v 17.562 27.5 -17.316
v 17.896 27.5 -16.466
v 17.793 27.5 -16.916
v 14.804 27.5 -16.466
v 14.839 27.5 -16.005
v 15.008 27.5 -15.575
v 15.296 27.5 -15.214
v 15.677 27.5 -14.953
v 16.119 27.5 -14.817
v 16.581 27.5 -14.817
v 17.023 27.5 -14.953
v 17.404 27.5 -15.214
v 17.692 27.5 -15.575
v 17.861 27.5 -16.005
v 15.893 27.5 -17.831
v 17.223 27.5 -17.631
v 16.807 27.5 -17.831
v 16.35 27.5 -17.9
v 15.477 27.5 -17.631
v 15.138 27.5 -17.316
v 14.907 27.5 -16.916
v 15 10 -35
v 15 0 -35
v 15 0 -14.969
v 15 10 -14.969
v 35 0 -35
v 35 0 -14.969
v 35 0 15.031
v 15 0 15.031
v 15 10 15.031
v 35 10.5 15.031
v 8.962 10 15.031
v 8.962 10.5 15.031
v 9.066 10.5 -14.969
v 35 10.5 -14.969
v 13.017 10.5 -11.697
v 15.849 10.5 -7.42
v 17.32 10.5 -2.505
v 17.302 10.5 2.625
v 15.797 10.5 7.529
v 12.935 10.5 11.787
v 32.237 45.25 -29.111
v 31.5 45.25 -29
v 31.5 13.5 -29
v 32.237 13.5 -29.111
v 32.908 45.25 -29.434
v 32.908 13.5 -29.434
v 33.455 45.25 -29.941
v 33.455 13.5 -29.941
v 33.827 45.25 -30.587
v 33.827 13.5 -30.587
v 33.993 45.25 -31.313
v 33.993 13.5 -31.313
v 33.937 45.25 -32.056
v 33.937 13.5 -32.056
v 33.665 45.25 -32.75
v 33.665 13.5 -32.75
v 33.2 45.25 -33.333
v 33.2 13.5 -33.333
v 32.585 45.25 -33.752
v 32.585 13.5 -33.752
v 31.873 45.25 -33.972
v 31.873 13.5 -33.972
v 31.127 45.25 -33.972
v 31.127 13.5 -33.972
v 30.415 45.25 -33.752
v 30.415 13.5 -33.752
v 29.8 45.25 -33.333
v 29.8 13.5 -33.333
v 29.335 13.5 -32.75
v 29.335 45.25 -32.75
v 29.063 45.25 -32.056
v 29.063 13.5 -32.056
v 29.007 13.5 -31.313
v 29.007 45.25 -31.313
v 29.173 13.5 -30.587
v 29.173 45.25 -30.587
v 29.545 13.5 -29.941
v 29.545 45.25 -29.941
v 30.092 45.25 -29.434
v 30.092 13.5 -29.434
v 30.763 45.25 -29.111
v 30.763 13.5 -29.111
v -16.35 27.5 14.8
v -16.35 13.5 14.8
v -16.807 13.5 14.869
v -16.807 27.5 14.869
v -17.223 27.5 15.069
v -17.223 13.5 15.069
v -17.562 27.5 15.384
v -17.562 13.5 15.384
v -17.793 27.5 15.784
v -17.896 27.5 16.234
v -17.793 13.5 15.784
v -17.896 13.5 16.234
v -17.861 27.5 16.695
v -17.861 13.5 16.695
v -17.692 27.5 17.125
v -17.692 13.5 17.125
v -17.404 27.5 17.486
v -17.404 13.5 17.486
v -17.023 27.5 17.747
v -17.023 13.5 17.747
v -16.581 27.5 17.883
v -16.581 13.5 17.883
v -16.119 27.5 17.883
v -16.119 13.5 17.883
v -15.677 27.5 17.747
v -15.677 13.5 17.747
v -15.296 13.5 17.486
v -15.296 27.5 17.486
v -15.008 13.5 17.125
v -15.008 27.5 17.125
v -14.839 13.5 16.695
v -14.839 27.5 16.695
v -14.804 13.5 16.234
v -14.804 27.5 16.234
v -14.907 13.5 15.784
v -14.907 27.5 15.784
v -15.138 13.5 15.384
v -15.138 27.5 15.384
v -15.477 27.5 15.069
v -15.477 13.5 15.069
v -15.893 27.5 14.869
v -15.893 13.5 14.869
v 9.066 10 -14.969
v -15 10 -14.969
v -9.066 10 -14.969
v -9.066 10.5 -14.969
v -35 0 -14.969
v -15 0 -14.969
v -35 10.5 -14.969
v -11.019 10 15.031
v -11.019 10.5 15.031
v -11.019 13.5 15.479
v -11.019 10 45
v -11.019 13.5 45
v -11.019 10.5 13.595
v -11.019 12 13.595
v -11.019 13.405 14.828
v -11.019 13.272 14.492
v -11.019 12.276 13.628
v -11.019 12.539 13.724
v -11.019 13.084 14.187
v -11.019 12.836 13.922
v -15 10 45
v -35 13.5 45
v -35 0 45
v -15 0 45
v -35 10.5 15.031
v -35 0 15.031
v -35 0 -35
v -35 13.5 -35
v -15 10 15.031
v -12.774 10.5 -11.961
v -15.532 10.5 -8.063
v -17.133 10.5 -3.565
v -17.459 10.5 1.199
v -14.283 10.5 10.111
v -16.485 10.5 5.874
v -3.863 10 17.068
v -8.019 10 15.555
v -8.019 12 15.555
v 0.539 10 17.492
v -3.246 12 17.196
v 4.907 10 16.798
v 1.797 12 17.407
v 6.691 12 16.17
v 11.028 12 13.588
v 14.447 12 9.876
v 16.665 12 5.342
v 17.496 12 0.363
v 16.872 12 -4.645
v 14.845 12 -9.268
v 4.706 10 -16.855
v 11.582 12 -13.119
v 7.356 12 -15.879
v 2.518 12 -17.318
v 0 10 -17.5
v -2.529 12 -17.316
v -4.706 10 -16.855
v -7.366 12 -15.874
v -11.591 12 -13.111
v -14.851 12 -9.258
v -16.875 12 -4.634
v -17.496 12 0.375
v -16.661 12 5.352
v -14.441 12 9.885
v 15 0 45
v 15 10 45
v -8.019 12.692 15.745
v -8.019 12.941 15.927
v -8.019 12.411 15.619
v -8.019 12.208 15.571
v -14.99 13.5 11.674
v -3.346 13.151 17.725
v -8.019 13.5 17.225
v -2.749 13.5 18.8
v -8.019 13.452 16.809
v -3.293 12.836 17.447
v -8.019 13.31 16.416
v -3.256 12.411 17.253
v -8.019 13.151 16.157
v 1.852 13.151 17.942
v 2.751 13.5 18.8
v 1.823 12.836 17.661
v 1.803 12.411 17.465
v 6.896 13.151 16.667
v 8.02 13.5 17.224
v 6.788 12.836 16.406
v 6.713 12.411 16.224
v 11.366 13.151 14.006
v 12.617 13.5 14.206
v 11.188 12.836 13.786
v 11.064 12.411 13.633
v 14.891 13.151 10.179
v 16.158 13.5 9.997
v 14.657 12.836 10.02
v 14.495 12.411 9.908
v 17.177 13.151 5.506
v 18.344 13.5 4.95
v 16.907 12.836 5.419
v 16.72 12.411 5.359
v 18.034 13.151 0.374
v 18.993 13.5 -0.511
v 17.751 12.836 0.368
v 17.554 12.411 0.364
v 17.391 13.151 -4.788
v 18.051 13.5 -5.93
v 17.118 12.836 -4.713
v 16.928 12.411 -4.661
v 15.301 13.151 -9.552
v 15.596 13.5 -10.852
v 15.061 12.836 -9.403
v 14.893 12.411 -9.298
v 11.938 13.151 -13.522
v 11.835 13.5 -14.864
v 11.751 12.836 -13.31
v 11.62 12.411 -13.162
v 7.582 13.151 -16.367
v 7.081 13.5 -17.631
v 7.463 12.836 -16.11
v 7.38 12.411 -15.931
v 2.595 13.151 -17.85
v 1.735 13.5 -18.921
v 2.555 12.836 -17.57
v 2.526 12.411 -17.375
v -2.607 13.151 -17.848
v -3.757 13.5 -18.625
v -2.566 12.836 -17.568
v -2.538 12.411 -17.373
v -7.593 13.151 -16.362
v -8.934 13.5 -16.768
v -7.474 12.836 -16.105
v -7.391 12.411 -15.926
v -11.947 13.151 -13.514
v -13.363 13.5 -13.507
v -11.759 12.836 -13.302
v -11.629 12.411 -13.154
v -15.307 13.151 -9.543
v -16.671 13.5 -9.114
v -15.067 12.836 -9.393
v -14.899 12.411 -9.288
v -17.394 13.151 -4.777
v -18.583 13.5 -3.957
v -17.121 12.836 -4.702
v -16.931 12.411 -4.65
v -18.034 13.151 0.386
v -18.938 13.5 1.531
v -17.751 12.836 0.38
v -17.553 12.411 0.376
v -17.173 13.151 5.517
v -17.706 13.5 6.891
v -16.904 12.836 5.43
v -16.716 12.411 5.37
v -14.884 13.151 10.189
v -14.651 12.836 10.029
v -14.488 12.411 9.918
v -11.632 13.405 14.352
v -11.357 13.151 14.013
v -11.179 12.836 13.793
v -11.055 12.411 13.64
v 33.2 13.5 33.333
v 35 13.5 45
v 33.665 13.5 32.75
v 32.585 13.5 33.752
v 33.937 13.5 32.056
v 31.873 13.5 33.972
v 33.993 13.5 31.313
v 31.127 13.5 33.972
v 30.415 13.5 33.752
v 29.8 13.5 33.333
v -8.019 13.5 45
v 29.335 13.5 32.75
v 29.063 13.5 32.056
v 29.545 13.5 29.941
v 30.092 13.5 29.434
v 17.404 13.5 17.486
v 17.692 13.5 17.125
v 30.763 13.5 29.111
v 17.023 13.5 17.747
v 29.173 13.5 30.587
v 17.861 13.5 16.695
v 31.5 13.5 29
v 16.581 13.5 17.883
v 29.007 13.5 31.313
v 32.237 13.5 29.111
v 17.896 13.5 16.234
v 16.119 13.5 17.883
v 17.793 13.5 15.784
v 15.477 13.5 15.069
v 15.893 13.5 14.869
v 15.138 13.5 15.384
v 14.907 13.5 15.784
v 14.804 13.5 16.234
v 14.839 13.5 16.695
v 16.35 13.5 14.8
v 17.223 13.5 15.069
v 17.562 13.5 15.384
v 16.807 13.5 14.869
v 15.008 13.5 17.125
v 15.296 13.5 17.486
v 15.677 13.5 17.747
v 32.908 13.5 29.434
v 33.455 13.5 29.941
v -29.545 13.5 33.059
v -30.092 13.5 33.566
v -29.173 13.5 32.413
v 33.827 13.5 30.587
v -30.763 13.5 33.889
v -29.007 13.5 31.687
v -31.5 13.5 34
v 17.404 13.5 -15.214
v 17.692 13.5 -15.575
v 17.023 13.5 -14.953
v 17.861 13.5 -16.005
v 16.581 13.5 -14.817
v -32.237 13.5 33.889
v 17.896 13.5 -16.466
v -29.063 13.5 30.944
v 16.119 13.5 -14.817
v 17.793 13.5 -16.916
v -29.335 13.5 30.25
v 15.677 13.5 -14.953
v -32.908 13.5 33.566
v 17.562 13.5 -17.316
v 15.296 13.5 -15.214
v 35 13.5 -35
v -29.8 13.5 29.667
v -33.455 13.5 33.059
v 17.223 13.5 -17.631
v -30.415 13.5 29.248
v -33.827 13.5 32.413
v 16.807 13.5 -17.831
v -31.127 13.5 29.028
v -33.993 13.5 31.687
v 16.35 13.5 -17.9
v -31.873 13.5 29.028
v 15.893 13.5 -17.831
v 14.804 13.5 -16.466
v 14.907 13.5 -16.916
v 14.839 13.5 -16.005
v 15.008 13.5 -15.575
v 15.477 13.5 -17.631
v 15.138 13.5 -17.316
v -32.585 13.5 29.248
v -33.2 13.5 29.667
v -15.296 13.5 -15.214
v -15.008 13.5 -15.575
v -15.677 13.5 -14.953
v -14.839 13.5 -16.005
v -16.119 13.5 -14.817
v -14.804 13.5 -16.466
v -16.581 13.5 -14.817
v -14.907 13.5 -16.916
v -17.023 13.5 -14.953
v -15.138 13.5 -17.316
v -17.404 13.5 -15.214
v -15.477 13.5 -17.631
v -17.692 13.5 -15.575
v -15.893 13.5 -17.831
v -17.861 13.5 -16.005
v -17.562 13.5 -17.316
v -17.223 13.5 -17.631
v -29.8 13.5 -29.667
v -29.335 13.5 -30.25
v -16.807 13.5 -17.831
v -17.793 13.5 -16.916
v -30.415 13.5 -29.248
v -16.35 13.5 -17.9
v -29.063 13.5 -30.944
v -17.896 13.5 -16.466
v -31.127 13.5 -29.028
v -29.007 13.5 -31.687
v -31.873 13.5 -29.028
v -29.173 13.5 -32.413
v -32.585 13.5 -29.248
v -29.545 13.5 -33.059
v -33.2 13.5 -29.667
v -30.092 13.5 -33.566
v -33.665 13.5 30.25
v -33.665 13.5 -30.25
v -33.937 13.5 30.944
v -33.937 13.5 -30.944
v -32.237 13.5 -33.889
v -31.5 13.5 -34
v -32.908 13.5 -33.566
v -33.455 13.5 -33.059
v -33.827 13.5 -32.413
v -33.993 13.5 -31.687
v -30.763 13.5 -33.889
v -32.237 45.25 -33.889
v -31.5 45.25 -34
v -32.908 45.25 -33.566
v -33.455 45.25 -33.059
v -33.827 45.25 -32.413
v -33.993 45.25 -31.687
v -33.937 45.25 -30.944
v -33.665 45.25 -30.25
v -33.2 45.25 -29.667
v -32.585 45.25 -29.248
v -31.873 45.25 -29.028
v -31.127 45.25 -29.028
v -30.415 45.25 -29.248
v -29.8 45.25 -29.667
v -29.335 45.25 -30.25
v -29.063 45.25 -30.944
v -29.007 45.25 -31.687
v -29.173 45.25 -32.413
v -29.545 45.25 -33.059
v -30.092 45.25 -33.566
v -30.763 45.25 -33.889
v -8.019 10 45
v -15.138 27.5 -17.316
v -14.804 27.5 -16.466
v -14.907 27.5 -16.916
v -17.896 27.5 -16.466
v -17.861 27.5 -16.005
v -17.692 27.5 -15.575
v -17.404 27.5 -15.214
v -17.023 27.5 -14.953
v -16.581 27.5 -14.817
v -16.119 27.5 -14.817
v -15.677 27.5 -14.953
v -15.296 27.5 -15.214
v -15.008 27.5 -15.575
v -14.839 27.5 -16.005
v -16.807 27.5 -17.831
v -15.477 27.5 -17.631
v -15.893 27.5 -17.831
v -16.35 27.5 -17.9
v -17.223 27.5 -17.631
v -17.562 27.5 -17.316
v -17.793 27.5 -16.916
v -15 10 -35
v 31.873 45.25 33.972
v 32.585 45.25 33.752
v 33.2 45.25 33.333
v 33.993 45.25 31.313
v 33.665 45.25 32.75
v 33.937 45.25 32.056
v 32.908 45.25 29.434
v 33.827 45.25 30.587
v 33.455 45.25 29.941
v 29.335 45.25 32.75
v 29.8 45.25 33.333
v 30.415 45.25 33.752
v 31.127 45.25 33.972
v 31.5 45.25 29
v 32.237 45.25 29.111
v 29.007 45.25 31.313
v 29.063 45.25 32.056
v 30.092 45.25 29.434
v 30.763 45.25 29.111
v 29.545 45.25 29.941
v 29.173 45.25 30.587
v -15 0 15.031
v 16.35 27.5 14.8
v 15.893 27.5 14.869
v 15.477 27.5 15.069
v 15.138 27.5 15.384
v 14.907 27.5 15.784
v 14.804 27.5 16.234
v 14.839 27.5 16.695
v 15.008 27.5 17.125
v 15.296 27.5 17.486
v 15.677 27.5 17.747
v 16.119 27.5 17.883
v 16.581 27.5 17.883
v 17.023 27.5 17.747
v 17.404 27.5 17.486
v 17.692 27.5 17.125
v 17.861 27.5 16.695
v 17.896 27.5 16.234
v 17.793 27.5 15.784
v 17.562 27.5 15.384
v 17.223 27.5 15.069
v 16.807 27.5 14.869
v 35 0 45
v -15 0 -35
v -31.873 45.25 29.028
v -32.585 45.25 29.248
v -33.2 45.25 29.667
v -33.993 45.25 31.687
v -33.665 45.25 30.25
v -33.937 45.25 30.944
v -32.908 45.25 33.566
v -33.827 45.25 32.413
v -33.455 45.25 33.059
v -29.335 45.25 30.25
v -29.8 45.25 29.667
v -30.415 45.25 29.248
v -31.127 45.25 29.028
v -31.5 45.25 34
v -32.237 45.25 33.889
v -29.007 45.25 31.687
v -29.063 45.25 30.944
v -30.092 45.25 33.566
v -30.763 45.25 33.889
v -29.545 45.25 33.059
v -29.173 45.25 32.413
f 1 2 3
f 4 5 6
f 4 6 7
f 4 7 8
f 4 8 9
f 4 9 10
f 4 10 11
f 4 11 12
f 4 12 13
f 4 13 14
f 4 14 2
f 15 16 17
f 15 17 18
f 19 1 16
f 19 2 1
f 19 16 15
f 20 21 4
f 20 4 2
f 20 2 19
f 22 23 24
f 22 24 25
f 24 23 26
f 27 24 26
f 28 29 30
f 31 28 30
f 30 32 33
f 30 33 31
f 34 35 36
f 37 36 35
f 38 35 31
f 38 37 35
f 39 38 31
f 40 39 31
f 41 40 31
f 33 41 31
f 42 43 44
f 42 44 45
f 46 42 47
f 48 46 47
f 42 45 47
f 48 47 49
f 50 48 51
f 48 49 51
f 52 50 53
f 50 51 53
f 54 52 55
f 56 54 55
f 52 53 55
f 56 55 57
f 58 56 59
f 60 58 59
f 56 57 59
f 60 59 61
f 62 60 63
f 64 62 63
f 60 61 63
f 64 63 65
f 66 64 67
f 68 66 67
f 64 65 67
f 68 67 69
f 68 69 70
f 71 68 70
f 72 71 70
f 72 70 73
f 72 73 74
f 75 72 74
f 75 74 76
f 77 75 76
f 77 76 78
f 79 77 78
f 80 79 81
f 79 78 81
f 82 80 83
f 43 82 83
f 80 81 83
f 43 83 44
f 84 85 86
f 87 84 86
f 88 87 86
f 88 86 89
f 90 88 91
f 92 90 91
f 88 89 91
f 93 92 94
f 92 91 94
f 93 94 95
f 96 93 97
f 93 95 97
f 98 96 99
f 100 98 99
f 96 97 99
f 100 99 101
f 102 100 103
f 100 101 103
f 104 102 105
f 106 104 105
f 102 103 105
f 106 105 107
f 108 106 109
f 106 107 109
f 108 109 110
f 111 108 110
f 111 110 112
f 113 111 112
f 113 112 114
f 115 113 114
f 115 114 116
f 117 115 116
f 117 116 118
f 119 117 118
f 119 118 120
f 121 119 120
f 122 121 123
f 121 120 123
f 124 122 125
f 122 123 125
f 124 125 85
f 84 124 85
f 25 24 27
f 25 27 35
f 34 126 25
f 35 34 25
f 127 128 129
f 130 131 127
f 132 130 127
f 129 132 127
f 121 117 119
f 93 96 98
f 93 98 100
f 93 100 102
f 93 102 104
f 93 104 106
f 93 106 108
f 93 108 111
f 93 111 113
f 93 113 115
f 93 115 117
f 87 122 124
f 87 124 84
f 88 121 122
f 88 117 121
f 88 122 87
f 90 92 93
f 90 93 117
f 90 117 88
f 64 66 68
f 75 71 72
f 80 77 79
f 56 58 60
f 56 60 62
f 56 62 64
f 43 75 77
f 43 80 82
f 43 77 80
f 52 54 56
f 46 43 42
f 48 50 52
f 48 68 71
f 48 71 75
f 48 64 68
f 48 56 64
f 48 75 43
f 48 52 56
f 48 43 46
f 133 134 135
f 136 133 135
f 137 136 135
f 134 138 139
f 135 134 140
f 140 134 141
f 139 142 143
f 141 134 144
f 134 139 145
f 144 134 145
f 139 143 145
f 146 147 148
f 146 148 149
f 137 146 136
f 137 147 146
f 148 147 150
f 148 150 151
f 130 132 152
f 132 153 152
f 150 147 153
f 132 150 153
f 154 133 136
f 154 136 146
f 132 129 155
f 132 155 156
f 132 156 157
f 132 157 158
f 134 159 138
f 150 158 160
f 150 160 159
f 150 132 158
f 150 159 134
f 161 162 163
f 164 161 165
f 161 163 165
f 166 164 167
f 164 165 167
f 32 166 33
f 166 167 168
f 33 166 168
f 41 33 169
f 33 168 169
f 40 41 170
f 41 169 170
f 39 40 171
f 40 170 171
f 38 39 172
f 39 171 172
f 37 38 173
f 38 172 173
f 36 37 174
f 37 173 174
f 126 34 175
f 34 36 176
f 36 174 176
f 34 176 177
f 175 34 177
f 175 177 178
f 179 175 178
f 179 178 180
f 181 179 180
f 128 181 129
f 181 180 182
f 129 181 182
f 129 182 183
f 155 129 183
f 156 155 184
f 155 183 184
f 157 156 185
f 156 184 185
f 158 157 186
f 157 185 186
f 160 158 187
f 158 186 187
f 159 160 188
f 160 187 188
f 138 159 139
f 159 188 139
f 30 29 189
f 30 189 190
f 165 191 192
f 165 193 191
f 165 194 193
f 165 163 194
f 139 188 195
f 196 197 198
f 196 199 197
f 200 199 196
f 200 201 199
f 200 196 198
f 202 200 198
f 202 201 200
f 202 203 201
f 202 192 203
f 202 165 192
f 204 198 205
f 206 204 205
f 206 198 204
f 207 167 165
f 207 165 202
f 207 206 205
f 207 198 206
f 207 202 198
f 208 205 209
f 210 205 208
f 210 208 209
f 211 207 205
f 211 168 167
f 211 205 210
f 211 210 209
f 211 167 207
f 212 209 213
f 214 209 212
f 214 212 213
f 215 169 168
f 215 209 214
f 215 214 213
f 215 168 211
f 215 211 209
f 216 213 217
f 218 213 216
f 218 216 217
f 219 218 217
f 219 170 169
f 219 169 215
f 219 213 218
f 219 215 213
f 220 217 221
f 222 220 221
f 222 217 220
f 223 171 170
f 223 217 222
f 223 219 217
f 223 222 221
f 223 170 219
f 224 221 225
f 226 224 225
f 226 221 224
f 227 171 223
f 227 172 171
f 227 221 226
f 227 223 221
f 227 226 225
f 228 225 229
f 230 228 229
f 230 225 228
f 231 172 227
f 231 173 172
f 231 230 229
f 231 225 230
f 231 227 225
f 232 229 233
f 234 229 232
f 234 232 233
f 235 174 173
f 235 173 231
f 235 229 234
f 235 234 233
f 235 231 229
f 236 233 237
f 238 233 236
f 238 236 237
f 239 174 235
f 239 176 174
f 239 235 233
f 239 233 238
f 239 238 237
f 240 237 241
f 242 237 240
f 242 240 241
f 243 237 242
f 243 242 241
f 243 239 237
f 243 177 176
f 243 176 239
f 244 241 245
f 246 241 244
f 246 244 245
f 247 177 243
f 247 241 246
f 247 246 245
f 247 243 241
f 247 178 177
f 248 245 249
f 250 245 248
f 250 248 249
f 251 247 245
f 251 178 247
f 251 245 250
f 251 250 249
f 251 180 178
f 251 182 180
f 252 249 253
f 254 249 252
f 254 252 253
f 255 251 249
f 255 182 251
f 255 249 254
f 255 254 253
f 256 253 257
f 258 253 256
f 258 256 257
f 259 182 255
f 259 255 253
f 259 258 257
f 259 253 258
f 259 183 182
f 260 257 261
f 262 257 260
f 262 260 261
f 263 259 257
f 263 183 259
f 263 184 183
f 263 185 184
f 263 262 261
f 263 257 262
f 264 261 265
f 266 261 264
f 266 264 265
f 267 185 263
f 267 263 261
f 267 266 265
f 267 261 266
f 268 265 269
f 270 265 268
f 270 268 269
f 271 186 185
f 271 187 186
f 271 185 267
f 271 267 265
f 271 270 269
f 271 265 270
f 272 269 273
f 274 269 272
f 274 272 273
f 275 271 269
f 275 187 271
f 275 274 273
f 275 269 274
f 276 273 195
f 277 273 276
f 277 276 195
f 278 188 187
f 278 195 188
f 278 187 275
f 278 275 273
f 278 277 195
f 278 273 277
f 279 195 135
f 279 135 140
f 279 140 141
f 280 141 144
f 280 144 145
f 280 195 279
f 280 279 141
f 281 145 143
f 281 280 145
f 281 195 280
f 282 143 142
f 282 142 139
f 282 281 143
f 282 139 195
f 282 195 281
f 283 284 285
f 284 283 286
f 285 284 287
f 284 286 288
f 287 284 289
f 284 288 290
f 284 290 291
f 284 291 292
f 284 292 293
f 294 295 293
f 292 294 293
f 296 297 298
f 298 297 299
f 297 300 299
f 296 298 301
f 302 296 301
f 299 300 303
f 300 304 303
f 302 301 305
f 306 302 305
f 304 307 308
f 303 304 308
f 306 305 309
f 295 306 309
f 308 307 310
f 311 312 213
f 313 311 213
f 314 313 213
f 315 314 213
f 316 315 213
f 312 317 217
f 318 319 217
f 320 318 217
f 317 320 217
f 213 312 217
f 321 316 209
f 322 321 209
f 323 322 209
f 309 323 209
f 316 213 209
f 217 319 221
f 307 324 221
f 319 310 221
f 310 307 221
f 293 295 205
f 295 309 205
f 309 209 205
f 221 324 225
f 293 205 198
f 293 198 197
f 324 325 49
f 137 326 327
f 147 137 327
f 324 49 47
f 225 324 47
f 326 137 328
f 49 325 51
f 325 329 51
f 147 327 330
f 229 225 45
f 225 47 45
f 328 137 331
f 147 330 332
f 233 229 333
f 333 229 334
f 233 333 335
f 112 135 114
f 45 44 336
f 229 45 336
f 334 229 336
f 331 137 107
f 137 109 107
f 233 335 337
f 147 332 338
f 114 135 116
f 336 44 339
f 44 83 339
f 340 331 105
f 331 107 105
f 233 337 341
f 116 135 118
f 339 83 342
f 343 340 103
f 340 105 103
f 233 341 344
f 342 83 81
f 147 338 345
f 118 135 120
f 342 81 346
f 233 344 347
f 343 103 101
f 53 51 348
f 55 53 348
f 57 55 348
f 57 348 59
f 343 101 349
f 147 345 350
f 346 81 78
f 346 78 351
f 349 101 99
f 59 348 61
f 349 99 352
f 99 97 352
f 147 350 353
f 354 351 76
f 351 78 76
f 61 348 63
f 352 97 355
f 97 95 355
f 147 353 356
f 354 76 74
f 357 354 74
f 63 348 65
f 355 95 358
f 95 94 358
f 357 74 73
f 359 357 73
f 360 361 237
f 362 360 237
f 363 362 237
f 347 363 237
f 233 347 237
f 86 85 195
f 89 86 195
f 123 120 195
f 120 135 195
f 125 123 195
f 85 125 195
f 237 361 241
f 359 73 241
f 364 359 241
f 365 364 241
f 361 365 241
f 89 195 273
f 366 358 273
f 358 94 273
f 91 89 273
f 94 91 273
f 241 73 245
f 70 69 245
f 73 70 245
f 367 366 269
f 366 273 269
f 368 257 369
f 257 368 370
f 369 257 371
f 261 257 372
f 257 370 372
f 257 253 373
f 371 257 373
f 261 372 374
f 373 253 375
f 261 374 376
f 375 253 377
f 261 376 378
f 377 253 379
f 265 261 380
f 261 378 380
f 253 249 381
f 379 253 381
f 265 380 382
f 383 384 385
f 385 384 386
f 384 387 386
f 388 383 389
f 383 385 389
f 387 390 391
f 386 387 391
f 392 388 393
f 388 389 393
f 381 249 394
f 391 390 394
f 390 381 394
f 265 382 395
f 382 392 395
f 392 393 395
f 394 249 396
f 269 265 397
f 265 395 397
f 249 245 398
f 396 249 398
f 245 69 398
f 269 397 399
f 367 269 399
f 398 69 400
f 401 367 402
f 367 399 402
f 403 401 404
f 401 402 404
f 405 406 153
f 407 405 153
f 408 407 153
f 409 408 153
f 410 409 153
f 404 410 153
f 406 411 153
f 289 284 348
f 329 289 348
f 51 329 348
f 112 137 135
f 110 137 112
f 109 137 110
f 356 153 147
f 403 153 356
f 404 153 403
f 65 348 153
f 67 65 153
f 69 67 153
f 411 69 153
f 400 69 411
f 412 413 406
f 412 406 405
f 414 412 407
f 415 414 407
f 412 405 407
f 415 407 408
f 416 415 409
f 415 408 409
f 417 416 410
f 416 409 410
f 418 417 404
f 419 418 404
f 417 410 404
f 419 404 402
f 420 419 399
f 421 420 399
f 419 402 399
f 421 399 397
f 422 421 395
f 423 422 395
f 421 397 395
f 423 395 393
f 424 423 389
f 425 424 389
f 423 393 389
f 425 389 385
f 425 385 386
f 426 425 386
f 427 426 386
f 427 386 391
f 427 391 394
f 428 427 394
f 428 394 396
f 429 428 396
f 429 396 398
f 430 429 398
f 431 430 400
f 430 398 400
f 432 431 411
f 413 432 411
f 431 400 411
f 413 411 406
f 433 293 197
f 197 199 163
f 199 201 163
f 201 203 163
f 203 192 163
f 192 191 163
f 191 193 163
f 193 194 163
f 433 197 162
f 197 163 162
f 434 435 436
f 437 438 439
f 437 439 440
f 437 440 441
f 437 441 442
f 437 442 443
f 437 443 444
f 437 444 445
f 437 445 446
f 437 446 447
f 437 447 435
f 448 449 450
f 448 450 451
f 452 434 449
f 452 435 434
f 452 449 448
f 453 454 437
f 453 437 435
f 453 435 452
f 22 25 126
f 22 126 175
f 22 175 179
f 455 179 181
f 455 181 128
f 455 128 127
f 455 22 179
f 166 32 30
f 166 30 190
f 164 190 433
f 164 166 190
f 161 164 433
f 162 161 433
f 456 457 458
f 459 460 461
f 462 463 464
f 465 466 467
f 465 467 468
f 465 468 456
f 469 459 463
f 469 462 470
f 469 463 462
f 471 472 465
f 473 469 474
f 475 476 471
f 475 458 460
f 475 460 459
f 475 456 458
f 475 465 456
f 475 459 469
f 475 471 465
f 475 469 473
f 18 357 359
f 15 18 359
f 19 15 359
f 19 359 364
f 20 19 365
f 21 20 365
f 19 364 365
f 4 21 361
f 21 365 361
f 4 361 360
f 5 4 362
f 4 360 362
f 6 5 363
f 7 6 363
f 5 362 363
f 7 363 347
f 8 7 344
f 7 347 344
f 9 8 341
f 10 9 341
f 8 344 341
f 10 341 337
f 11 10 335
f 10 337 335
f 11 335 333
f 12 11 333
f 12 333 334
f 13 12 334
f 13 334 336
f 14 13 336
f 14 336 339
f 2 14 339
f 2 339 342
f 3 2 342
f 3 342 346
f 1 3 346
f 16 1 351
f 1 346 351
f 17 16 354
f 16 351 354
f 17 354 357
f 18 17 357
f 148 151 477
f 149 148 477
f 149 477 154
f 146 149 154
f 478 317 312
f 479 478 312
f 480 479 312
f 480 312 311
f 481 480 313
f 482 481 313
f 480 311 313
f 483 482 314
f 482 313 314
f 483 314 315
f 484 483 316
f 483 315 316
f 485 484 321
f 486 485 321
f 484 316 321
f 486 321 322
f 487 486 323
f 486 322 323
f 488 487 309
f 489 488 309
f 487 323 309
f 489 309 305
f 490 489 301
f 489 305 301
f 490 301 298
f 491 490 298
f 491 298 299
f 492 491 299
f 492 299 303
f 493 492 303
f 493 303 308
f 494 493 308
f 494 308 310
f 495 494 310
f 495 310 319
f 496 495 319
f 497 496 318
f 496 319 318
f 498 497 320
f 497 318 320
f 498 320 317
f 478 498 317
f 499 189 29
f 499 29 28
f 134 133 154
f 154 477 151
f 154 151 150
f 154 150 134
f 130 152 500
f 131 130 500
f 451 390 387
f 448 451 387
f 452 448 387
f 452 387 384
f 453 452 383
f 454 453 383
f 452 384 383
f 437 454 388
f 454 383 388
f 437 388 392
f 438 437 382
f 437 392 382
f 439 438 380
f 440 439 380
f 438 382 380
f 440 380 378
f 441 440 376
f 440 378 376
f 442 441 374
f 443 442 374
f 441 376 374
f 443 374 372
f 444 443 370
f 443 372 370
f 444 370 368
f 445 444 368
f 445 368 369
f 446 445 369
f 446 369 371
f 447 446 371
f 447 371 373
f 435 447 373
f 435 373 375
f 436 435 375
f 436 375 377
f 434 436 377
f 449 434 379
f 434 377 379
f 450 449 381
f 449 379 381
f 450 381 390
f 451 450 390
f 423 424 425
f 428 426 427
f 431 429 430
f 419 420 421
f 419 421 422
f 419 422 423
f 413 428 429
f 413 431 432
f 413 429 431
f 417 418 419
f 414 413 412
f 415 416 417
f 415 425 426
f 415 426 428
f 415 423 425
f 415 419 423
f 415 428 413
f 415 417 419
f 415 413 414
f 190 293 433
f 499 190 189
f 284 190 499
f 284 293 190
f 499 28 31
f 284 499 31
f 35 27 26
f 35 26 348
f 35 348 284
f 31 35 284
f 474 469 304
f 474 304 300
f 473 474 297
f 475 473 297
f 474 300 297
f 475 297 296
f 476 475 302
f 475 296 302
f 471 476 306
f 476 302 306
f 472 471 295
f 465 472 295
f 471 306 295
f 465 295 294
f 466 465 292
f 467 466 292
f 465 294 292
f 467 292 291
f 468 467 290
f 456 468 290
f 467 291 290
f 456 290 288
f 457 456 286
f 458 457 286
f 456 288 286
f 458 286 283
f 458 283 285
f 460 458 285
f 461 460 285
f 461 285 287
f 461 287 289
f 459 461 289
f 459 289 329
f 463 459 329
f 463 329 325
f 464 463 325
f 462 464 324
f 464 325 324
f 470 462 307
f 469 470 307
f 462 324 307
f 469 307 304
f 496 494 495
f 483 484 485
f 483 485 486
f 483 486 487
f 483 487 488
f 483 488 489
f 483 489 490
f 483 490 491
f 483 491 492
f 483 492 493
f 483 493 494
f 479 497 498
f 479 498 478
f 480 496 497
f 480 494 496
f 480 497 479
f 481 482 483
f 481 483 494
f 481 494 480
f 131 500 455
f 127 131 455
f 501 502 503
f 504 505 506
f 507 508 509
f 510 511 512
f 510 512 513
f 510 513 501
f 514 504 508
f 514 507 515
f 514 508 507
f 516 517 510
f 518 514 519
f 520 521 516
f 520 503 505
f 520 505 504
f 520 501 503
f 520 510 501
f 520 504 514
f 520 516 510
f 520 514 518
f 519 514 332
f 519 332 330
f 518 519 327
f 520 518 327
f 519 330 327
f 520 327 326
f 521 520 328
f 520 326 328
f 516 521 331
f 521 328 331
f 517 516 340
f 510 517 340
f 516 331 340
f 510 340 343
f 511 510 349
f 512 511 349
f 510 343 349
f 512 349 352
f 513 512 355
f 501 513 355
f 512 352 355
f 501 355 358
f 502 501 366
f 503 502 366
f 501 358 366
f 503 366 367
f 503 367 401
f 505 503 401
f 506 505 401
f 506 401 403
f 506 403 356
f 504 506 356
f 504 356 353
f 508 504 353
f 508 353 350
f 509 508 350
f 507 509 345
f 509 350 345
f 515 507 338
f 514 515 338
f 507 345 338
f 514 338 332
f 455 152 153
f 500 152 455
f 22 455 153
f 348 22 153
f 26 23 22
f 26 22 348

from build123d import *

# Parameters (mm, degrees)
SKETCH1_W           = 70
SKETCH1_H           = 70
BOSS_EXTRUDE1_DEPTH = 13.5
SKETCH5_R           = 1.55
FANS_COLUMN_DEPTH   = 14
SKETCH6_R           = 17.5
CUT_EXTRUDE2_DEPTH  = 15
FILLET1_R           = 1.5
SKETCH7_R           = 2.5
BOSS_EXTRUDE4_DEPTH = 31.75
SKETCH8_W           = 3
SKETCH8_H           = 4
CUT_EXTRUDE3_DEPTH  = 22
BOSS_EXTRUDE5_DEPTH = 10
SKETCH10_W          = 30
SKETCH10_H          = 10.5
CUT_EXTRUDE4_DEPTH  = 95.723611148
SKETCH11_W          = 30
SKETCH11_H          = 10
CUT_EXTRUDE5_DEPTH  = 99.349186657


with BuildPart() as part:
    # Sketch1 → Boss-Extrude1 (new body)
    with BuildSketch(Plane(origin=(0, 0, 0), x_dir=(1, 0, 0), z_dir=(0, 1, 0))):
        Rectangle(SKETCH1_W, SKETCH1_H)
    extrude(amount=BOSS_EXTRUDE1_DEPTH)

    # Sketch5 → Fans_Column (add)
    with BuildSketch(Plane(origin=(0, 13.5, 0), x_dir=(1, 0, 0), z_dir=(0, 1, 0))):
        with Locations(Location((-16.35, 16.35, 0), (0, 0, 90))):
            Circle(SKETCH5_R)
        with Locations(Location((16.35, 16.35, 0), (0, 0, 90))):
            Circle(SKETCH5_R)
        with Locations(Location((16.35, -16.35, 0), (0, 0, 90))):
            Circle(SKETCH5_R)
        with Locations(Location((-16.35, -16.35, 0), (0, 0, 90))):
            Circle(SKETCH5_R)
    extrude(amount=FANS_COLUMN_DEPTH)

    # Sketch6 → Cut-Extrude2 (cut)
    with BuildSketch(Plane(origin=(0, 13.5, 0), x_dir=(1, 0, 0), z_dir=(0, 1, 0))):
        with Locations(Location((0, 0, 0), (0, 0, 270))):
            Circle(SKETCH6_R)
    extrude(amount=-CUT_EXTRUDE2_DEPTH, mode=Mode.SUBTRACT)

    # Fillet1
    fillet1_edges = [part.edges().sort_by_distance(p)[0] for p in [
        (0, 13.5, -17.5),
    ]]
    fillet(fillet1_edges, radius=FILLET1_R)

    # Sketch7 → Boss-Extrude4 (add)
    with BuildSketch(Plane(origin=(0, 13.5, 0), x_dir=(1, 0, 0), z_dir=(0, 1, 0))):
        with Locations(Location((-31.5, -31.5, 0), (0, 0, 270))):
            Circle(SKETCH7_R)
        with Locations(Location((-31.5, 31.5, 0), (0, 0, 90))):
            Circle(SKETCH7_R)
        with Locations(Location((31.5, 31.5, 0), (0, 0, 270))):
            Circle(SKETCH7_R)
        with Locations(Location((31.5, -31.5, 0), (0, 0, 90))):
            Circle(SKETCH7_R)
    extrude(amount=BOSS_EXTRUDE4_DEPTH)

    # Sketch8 → Cut-Extrude3 (cut)
    with BuildSketch(Plane.XY.offset(35)):
        with Locations((-9.518750433, 11.5)):
            Rectangle(SKETCH8_W, SKETCH8_H)
    extrude(amount=-CUT_EXTRUDE3_DEPTH, mode=Mode.SUBTRACT)

    # Sketch9 → Boss-Extrude5 (add)
    with BuildSketch(Plane.XY.offset(35)):
        Polygon((-8.018750433, 9.5), (-11.018750433, 9.5), (-11.018750433, 13.5), (-35, 13.5), (-35, 0), (35, 0), (35, 13.5), (-8.018750433, 13.5), align=None)
    extrude(amount=BOSS_EXTRUDE5_DEPTH)

    # Sketch10 → Cut-Extrude4 (cut, through all)
    with BuildSketch(Plane.ZY.offset(35)):
        with Locations((0.031213212, 5.25)):
            Rectangle(SKETCH10_W, SKETCH10_H)
    extrude(amount=-CUT_EXTRUDE4_DEPTH, mode=Mode.SUBTRACT)

    # Sketch11 → Cut-Extrude5 (cut, through all)
    with BuildSketch(Plane(origin=(0, 0, -35), x_dir=(-1, 0, 0), z_dir=(0, 0, -1))):
        with Locations((0, 5)):
            Rectangle(SKETCH11_W, SKETCH11_H)
    extrude(amount=-CUT_EXTRUDE5_DEPTH, mode=Mode.SUBTRACT)


solid = part.part
